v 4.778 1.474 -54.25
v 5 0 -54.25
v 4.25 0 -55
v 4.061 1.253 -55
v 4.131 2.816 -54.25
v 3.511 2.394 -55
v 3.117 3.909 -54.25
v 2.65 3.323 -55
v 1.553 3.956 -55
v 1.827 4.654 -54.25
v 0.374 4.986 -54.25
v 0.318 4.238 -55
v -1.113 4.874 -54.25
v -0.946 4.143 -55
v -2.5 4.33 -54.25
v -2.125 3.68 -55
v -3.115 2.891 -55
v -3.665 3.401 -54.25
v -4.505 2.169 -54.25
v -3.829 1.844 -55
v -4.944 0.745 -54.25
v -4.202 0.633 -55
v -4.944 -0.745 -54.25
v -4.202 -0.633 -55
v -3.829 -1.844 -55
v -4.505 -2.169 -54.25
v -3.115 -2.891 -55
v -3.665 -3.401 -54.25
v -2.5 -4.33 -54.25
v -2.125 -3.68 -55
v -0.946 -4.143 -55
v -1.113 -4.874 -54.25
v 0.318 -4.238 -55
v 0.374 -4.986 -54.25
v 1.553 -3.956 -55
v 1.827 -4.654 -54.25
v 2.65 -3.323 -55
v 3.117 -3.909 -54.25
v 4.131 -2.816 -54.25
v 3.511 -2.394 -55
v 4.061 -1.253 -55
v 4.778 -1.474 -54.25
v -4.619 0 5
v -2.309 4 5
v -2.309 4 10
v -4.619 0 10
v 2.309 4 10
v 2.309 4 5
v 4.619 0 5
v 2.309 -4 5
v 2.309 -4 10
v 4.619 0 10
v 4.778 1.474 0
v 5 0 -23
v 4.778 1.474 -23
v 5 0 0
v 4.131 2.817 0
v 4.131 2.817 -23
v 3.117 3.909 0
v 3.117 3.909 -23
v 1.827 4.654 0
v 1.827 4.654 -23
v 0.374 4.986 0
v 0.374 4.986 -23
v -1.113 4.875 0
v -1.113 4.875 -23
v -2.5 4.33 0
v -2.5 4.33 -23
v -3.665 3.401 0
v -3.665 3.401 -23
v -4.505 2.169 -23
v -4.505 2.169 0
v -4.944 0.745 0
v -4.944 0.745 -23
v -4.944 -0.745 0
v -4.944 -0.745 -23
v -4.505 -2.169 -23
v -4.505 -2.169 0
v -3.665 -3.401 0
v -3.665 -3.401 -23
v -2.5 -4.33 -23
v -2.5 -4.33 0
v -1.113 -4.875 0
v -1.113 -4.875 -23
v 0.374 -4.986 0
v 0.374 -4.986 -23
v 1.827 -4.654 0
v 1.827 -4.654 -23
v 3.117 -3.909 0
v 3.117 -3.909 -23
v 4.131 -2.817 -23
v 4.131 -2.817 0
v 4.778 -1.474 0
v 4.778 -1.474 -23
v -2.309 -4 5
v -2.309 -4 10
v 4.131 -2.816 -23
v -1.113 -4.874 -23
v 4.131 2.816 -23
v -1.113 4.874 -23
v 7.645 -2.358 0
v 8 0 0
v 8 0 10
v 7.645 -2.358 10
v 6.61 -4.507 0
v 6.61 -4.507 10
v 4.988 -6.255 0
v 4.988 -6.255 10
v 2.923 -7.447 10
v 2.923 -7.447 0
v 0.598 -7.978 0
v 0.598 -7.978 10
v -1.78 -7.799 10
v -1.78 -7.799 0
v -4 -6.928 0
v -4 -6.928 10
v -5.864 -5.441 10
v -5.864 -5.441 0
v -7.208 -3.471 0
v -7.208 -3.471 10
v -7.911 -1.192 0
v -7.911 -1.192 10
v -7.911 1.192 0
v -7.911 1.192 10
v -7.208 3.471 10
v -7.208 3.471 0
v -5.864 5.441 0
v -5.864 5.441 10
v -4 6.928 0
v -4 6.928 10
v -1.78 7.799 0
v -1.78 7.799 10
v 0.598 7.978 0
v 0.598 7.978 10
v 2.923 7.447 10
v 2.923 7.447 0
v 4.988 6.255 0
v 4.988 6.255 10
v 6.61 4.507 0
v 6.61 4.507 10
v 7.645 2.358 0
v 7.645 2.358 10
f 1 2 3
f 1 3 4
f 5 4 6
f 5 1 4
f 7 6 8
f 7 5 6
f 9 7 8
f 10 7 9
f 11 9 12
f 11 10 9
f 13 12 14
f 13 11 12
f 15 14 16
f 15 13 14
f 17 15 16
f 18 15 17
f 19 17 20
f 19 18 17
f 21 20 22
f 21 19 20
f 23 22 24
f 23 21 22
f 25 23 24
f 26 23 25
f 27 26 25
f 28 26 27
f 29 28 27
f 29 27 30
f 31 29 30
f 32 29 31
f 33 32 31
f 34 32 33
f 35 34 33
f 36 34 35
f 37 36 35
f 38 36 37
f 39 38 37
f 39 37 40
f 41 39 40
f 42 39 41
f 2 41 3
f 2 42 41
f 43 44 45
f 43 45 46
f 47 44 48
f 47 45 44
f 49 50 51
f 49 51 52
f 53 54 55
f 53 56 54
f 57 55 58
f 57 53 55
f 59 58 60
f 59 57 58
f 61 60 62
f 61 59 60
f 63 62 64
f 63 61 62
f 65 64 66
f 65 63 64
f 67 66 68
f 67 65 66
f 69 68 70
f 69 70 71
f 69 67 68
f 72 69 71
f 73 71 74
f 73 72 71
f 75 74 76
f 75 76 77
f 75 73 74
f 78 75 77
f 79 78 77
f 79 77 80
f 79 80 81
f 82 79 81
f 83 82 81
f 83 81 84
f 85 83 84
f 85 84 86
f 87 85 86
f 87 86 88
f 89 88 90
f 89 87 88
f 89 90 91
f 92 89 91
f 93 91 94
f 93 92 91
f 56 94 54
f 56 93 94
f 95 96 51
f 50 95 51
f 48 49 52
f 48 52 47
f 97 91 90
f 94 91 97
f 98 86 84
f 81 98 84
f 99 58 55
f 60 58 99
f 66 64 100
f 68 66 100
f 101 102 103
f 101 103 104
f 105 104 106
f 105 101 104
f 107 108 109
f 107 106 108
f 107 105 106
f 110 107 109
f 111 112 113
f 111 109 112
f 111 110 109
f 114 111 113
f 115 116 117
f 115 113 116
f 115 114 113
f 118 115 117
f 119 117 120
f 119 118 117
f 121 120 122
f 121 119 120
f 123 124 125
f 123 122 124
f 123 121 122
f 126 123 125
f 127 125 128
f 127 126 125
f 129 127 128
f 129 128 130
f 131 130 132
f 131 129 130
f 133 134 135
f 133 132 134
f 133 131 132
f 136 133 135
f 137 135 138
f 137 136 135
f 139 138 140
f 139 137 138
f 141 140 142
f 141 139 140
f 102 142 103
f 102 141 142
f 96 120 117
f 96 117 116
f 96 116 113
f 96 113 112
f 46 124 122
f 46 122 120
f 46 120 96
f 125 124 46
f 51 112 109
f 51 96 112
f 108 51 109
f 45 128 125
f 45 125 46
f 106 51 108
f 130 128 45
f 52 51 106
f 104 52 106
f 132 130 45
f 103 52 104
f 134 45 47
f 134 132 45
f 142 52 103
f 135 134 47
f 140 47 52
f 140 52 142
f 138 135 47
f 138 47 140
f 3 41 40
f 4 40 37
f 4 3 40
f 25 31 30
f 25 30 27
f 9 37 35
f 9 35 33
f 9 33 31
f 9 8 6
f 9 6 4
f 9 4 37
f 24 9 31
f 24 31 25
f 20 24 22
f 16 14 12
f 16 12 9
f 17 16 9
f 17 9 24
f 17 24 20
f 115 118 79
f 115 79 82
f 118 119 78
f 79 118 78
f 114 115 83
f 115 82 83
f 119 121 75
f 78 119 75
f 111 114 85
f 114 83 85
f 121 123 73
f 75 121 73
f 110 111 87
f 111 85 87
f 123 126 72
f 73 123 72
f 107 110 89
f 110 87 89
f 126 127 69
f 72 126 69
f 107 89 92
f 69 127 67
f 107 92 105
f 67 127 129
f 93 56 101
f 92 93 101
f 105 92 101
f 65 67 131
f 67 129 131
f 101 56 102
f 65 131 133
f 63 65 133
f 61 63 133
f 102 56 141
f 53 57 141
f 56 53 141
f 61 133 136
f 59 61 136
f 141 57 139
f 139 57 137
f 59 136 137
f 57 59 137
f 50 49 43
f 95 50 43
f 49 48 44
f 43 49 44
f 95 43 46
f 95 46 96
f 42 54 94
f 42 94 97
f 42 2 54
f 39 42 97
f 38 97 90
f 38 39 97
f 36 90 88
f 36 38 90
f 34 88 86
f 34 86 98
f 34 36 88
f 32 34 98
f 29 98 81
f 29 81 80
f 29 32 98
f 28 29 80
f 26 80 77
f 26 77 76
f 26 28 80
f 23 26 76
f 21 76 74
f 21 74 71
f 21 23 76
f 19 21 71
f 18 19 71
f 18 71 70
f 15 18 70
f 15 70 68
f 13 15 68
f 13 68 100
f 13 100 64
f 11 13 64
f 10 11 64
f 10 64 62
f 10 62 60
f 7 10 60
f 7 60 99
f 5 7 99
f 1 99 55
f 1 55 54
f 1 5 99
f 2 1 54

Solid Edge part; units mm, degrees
sketch "Sketch1" plane through (0, 0, 0) normal (0, 0, 1) x (1, 0, 0)
  circle A0 centre (0, 0) radius 8
  dimension "D1" = 16
extrude "Protrusion1" add sketch "Sketch1" along normal blind 10
sketch "Sketch2" plane through (0, 0, 0) normal (0, 0, -1) x (1, 0, 0)
  circle A0 centre (0, 0) radius 5
extrude "Protrusion2" add sketch "Sketch2" along normal blind 55
sketch "Sketch3" plane through (0, 0, -55) normal (0, 0, -1) x (1, 0, 0)
  circle A0 centre (0, 0) radius 4.9997
extrude "Cutout1" cut sketch "Sketch3" against normal blind 32 flip side to cut
chamfer "Chamfer_1" distance 0.75 angle 45 1 edges at (-4.9997, 0, -55)
sketch "Sketch4" plane through (0, 0, 10) normal (0, 0, 1) x (1, 0, 0)
  line L0 (-2.3094, 4) -> (2.3094, 4)
  line L1 (4.6188, 0) -> (2.3094, 4)
  line L2 (2.3094, -4) -> (4.6188, 0)
  line L3 (-2.3094, -4) -> (2.3094, -4)
  line L4 (-4.6188, 0) -> (-2.3094, -4)
  line L5 (-2.3094, 4) -> (-4.6188, 0)
  dimension "D1" = 8
extrude "Cutout2" cut sketch "Sketch4" against normal blind 5
properties part number "116106"
